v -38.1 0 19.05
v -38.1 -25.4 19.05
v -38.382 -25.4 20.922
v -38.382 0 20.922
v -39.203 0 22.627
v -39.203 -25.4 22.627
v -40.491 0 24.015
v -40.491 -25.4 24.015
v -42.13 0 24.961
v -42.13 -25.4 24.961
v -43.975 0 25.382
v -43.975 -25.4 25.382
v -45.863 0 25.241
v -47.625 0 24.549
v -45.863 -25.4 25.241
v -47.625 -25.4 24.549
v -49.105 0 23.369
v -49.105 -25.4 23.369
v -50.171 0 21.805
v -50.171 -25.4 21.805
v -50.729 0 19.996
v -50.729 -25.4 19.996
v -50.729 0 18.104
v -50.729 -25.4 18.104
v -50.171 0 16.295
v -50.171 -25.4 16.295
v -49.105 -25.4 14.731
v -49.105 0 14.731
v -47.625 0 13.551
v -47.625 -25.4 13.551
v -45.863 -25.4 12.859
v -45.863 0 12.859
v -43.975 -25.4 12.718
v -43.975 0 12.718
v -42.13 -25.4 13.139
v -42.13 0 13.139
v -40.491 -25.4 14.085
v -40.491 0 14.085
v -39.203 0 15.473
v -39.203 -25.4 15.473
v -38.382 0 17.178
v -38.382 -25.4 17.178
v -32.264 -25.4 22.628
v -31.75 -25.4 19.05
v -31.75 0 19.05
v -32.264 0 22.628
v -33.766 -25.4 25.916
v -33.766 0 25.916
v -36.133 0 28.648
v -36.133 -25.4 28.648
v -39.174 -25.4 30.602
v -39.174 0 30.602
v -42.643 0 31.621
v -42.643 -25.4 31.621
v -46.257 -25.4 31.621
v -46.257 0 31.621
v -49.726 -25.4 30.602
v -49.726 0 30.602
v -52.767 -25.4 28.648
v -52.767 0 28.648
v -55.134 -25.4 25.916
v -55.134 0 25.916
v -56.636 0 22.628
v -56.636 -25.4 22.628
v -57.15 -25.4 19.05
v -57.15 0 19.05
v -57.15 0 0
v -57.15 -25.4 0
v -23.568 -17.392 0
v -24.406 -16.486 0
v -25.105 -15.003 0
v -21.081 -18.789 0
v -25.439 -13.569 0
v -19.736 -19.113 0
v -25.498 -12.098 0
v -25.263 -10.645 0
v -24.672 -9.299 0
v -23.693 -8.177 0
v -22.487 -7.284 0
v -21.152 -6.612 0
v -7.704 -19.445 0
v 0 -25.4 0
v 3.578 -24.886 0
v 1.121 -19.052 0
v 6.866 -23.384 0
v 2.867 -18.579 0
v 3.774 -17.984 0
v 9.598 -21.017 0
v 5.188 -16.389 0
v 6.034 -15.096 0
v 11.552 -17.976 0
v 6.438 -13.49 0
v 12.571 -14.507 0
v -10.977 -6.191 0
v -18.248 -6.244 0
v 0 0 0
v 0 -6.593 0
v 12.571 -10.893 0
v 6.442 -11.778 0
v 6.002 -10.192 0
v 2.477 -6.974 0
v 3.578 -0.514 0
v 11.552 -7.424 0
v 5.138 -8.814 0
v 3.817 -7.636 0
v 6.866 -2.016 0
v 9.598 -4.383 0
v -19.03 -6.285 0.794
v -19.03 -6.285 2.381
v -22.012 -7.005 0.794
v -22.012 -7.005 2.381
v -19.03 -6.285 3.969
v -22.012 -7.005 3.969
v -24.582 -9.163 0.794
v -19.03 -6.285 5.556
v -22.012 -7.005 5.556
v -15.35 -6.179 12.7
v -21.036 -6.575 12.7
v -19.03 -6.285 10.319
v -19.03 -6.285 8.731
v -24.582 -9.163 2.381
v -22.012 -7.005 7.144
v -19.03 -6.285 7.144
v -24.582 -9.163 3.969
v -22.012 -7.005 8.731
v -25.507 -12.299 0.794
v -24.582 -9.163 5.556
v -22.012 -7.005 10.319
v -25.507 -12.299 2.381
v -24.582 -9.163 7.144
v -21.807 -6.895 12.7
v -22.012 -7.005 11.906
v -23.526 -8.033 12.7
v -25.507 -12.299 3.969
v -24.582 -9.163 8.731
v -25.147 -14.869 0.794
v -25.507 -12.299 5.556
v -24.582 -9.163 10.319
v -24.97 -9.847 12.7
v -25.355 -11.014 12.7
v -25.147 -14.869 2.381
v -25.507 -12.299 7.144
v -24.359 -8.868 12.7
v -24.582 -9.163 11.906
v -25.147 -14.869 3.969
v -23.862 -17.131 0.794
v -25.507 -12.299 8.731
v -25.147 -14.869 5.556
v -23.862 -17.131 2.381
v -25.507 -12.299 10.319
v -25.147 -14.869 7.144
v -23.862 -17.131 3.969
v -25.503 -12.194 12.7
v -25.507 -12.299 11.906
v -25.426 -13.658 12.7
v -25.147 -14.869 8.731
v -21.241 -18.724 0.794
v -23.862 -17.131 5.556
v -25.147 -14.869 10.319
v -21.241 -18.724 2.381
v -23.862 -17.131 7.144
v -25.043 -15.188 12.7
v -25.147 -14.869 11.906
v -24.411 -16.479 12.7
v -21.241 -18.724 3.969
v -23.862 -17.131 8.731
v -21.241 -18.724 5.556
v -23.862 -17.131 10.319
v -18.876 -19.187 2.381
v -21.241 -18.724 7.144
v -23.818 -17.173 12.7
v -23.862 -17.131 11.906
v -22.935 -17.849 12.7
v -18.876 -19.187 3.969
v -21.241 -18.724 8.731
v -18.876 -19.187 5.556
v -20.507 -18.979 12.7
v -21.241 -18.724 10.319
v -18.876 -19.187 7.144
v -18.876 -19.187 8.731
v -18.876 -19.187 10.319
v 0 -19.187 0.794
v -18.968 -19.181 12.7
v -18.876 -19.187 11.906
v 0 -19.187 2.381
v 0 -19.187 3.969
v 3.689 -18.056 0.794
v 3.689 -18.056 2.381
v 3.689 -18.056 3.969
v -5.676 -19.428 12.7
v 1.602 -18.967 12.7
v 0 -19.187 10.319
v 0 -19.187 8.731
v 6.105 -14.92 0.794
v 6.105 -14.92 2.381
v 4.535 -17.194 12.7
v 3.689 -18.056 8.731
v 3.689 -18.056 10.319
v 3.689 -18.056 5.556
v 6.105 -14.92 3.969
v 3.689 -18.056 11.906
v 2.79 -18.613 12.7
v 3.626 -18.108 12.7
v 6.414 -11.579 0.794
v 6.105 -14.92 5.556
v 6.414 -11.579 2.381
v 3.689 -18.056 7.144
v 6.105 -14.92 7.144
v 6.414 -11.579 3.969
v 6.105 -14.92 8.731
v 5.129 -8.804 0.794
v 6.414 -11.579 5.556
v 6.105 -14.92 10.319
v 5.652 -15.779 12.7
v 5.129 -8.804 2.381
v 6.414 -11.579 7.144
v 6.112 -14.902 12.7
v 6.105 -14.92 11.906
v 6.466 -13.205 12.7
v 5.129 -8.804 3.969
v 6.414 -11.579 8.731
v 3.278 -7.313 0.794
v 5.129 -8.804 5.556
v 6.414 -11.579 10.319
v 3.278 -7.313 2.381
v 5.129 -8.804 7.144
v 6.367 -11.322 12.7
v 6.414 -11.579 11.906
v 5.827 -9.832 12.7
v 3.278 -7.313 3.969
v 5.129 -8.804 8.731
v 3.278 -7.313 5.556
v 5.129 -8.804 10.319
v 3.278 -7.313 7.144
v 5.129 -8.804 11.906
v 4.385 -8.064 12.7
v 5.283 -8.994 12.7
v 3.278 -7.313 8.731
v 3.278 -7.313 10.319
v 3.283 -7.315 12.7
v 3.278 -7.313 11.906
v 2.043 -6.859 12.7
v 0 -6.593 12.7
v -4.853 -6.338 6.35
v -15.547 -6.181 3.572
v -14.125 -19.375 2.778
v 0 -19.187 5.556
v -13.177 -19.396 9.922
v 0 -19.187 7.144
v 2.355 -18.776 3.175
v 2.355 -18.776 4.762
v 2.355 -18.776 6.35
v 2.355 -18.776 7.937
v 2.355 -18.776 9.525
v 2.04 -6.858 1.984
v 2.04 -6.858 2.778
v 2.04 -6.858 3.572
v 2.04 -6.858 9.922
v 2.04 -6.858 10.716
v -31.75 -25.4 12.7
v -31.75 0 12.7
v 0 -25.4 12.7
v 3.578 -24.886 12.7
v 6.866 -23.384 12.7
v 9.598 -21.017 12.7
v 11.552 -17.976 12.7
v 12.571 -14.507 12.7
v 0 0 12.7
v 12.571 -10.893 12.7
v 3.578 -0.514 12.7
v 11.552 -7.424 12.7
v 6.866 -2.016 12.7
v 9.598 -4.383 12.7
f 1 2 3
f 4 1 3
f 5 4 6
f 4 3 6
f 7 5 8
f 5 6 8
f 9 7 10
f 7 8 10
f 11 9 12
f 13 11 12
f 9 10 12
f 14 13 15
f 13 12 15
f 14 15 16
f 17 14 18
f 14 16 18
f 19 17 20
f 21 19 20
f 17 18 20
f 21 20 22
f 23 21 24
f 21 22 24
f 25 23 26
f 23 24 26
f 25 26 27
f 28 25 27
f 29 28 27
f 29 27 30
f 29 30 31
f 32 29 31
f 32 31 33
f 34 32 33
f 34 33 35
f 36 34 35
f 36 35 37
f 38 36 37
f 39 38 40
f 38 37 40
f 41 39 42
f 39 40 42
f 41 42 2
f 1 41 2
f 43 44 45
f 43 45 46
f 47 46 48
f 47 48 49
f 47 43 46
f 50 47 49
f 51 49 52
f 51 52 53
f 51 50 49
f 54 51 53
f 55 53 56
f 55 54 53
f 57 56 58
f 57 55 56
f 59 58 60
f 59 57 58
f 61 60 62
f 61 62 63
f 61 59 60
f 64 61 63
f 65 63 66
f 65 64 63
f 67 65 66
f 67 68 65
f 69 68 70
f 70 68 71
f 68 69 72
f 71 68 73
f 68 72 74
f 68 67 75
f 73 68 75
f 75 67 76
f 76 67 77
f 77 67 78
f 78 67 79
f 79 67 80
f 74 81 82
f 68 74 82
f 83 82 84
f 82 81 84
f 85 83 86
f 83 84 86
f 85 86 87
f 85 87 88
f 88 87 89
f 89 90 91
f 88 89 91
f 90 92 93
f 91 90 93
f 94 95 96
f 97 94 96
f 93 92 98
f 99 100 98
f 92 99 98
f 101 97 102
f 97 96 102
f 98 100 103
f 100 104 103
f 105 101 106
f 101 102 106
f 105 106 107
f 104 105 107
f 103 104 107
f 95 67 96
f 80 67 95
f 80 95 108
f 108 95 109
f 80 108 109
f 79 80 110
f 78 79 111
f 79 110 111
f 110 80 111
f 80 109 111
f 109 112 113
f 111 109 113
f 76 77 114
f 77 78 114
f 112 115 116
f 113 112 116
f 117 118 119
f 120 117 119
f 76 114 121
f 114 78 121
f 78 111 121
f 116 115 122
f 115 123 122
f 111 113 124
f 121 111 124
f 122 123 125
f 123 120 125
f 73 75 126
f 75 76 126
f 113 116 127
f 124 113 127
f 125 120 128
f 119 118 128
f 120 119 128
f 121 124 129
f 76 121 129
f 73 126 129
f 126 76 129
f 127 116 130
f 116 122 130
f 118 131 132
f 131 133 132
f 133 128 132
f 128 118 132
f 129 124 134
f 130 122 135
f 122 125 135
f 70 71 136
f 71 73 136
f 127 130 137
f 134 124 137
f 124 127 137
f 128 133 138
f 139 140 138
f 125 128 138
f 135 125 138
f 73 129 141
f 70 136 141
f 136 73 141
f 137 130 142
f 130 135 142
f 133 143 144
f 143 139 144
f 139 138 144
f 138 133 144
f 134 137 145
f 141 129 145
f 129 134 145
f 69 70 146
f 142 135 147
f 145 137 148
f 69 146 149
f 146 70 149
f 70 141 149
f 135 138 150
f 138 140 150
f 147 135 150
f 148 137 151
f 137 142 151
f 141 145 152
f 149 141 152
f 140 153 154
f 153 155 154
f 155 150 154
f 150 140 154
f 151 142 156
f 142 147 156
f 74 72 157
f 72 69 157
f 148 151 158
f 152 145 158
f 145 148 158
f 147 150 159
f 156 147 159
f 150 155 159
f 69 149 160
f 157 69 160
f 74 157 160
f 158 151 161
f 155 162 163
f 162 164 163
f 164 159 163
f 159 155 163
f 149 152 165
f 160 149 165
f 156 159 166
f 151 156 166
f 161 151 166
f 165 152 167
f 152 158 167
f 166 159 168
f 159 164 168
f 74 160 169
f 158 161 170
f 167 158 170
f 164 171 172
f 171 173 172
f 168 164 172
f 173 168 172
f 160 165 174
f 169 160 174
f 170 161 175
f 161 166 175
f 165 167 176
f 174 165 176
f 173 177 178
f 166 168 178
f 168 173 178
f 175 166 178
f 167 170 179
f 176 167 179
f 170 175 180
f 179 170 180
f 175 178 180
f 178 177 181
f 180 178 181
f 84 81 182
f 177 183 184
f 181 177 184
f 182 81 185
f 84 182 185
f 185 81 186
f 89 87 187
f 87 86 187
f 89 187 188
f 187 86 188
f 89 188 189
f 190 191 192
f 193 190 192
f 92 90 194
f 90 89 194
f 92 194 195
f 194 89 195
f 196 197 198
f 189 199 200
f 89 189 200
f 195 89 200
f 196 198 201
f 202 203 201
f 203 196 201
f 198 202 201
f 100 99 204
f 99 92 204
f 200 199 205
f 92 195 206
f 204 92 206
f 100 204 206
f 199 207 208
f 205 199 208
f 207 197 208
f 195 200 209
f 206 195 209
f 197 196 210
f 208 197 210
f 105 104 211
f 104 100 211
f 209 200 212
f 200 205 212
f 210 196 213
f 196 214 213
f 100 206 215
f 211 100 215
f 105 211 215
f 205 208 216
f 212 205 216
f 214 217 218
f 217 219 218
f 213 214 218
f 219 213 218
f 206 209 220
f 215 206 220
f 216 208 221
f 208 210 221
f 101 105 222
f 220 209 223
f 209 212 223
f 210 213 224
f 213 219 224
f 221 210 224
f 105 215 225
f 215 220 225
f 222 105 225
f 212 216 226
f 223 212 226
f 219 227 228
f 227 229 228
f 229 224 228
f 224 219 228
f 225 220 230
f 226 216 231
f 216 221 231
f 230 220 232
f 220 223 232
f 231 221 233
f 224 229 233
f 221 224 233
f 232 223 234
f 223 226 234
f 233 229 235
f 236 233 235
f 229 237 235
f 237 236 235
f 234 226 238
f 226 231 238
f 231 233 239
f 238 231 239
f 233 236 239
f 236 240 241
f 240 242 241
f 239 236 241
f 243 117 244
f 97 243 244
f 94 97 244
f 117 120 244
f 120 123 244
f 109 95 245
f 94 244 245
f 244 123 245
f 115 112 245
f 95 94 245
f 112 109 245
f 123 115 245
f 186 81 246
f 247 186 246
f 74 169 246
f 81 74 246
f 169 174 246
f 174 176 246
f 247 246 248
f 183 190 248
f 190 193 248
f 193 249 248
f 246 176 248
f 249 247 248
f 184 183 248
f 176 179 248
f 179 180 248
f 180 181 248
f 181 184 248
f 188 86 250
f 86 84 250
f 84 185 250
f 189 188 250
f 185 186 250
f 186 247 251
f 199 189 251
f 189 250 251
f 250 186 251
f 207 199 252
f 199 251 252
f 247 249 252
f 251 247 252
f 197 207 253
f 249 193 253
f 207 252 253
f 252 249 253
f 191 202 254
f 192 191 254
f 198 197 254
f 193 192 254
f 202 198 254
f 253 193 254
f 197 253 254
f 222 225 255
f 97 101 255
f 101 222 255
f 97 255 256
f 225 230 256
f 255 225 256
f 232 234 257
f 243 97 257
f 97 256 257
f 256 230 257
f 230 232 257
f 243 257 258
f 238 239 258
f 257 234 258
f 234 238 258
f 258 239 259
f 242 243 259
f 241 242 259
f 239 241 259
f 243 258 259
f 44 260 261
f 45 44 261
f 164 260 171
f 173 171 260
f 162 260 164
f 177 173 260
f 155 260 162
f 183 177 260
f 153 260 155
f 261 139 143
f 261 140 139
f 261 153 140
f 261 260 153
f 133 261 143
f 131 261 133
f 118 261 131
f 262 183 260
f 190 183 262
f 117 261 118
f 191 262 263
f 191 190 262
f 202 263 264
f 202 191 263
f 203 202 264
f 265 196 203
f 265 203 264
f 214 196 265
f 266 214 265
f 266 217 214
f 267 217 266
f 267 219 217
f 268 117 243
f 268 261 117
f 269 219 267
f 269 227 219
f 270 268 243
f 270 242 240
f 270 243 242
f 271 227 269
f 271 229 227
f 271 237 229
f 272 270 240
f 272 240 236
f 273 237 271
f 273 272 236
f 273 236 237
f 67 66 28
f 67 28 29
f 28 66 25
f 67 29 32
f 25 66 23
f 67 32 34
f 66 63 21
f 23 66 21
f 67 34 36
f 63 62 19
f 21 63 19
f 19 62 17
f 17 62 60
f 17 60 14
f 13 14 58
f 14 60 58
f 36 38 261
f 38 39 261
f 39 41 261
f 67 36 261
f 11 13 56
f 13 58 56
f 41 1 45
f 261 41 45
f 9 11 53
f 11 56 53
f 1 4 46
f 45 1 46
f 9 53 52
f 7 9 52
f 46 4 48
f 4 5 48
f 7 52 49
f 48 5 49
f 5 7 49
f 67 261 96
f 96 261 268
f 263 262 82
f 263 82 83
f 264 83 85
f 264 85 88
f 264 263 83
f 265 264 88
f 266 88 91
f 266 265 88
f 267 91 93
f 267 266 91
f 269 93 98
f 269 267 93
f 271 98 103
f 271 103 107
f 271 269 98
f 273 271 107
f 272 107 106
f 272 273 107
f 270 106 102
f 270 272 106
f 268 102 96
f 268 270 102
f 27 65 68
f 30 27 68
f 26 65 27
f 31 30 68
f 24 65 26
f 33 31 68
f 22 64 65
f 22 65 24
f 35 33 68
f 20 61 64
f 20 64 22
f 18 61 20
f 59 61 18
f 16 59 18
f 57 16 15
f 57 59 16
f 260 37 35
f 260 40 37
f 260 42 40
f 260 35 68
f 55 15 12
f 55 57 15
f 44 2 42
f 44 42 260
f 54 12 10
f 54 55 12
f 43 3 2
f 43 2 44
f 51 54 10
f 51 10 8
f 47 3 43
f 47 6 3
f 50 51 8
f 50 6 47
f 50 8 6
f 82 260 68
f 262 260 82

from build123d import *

# Parameters (mm, degrees)
F0_W      = 57.15
F0_H      = 12.7
F1_DEPTH  = 25.4
F3_DEPTH  = 12.7
F4_W      = 25.4
F4_H      = 25.4
F5_DEPTH  = 6.35
F7_DEPTH  = 25.4
F8_R      = 6.35
F9_DEPTH  = 25.4
F13_DEPTH = 25.4


with BuildPart() as f1:
    # F0 (on Front) → F1 (new body)
    with BuildSketch(Plane.XZ):
        with Locations((-28.575, 6.35)):
            Rectangle(F0_W, F0_H)
    extrude(amount=F1_DEPTH)

    # F2 (on face) → F3 (join)
    with BuildSketch(Plane.XY.offset(12.7)):
        with BuildLine():
            Line((0, 0), (0, -25.4))
            ThreePointArc((0, -25.4), (12.7, -12.7), (0, 0))
        make_face()
    extrude(amount=-F3_DEPTH)

    # F4 (on face) → F5 (join)
    with BuildSketch(Plane.XY.offset(12.7)):
        with Locations((-44.45, -12.7)):
            Rectangle(F4_W, F4_H)
    extrude(amount=F5_DEPTH)

    # F6 (on face) → F7 (join)
    with BuildSketch(Plane.XZ.offset(25.4)):
        with BuildLine():
            Line((-57.15, 19.05), (-31.75, 19.05))
            ThreePointArc((-31.75, 19.05), (-44.45, 31.75), (-57.15, 19.05))
        make_face()
    extrude(amount=-F7_DEPTH)

    # F8 (on face) → F9 (cut)
    with BuildSketch(Plane.XZ.offset(25.4)):
        with Locations((-44.45, 19.05)):
            Circle(F8_R)
    extrude(amount=-F9_DEPTH, mode=Mode.SUBTRACT)

    # F12 (on face) → F13 (cut)
    with BuildSketch(Plane.XY.offset(12.7)):
        with BuildLine():
            add(Edge.make_bspline(
                [(0, -6.5933372825), (-4.3335288954, -6.2425928822), (-19.2539591524, -5.9431444544), (-21.8079181697, -6.752826897), (-24.9879208085, -8.9397704012), (-25.6916656891, -12.2881912477), (-25.2552966558, -14.8920624192), (-24.1547730186, -17.3307319105), (-21.0114621664, -18.9013892718), (-19.0587997011, -19.3613408528), (0.1798145996, -19.708351866), (3.602060698, -18.4234615524), (5.144307104, -16.4225065745), (6.3237311389, -15.0129096663), (6.7458982943, -11.4689345451), (5.3299737832, -8.7170187024), (3.1207753421, -7.0563532409), (1.8197760895, -6.7406251601), (0, -6.5933372825)],
                knots=[0, 0, 0, 0, 0.1348112712, 0.1889275212, 0.2455409547, 0.3014130243, 0.3511933359, 0.4010321383, 0.4551559961, 0.5031207882, 0.6373759331, 0.6980779281, 0.743358709, 0.7851075085, 0.8417109752, 0.8957548723, 0.9433887869, 1, 1, 1, 1], degree=3))
        make_face()
    extrude(amount=-F13_DEPTH, mode=Mode.SUBTRACT)


solid = f1.part
